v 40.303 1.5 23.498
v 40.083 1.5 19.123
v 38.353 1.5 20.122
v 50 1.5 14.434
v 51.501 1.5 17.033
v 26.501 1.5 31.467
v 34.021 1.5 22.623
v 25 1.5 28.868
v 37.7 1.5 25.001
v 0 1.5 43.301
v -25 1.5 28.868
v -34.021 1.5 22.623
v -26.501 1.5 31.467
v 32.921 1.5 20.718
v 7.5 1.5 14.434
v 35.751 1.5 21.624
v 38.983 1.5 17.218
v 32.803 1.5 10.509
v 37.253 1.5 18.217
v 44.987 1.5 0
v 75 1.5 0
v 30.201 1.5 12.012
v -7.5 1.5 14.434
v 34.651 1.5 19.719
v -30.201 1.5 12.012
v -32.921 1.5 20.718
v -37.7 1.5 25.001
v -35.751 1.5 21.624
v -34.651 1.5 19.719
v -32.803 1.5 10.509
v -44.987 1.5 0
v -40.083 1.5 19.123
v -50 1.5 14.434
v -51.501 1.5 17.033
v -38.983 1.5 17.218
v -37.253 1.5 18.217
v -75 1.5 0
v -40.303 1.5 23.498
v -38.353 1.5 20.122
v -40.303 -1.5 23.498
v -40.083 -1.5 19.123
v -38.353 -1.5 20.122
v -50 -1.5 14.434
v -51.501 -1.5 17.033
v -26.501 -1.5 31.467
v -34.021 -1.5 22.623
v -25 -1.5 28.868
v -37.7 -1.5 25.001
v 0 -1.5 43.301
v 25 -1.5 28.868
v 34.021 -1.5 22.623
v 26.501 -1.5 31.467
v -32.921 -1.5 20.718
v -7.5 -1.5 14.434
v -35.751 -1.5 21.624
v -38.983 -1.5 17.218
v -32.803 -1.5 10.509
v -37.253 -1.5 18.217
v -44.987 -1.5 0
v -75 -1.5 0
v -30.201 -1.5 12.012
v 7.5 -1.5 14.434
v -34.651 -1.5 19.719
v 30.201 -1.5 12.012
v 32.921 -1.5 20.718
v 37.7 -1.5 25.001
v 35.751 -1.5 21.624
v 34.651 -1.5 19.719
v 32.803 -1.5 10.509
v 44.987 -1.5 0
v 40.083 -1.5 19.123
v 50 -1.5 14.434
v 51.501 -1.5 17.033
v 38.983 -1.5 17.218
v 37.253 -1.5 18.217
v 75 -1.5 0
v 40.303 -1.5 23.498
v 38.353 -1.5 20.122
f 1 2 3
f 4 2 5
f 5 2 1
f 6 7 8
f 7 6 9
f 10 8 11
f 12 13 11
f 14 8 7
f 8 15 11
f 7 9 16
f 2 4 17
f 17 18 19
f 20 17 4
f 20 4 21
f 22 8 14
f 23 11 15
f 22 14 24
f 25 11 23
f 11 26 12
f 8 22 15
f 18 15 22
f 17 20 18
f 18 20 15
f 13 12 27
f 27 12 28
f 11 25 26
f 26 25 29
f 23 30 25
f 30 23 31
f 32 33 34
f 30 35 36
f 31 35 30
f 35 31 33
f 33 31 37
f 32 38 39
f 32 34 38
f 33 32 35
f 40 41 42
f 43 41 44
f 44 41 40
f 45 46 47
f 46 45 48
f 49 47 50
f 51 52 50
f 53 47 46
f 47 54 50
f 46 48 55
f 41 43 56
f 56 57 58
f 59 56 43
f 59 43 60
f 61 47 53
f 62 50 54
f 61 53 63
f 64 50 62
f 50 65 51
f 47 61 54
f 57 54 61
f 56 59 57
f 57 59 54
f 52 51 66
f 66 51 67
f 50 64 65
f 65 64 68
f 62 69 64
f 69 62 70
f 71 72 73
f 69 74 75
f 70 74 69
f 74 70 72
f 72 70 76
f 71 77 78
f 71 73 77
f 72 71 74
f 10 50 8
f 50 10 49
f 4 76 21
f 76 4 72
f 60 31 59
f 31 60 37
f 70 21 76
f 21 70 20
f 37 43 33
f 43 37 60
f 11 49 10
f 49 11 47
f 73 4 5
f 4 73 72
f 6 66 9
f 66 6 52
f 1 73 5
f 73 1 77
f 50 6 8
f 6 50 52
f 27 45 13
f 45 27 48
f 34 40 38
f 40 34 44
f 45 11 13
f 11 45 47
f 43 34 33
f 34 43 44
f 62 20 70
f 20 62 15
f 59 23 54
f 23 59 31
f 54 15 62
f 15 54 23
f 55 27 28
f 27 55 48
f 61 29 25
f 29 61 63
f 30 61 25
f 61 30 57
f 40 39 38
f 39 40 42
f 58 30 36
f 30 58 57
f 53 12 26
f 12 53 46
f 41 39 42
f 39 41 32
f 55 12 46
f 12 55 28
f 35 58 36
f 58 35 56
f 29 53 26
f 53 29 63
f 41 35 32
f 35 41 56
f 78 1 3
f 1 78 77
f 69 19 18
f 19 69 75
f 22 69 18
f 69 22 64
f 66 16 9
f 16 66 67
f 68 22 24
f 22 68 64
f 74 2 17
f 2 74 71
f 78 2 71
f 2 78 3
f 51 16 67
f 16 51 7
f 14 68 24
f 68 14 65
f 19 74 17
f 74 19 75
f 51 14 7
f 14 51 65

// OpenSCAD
// file: screw.scad
include <measures.scad>;

/*
 * Positive model of a cavity
 * required for pressing in a nut
 * and screwing in a screw
 */
module screw_cavity()
{
    // cavity for the screw thread
    translate([
        0,
        0,
        -screw_length/2
        ])
    cube([
        screw_radius,
        screw_radius,
        screw_length
        ], center=true);

    // cavity for the nut
    translate([
        0,
        0,
        -nut_offset
        ])
    cube([
        nut_wrench_size,
        nut_wrench_size,
        nut_height
        ], center=true);
}

screw_cavity();
// file: measures.scad
/*
 * All measures of the model
 * Default units: Millimeters
 */

// rendering parameters
$fn = 50;

// material to cut from
material_x = 480;
material_y = 270;
material_z = 3;

// house cuboid
house_x = 150;
house_y = 110;
house_z = 60;

// distances from left and bottom house edges
door_x = 35;
door_z = 35;
door_radius = 35/2;

window_offset_z = 12;
window_triangle_count_x = 7;
window_triangle_count_y = 5;

wall_y = house_y * 1/2;
wall_z = house_z * 4/5;
wall_offset_x = -15;

// pattern on the hallway wall
wall_pattern_offset_y = -19;
wall_pattern_offset_z = -19;
wall_triangle_count_x = 5;
wall_triangle_count_y = 4;

// how many holes per edge
strap_hole_count = 1;
strap_hole_radius = 3;
strap_hole_spacing = house_y/(strap_hole_count+1);
strap_hole_to_edge = 7;

// angle between upper house cuboid edge and roof plane in degrees
roof_angle = 30;

// elevation inside roof corner above upper edge of house cuboid
roof_elevation = tan(roof_angle) * house_x/2;

roof_support_cutout_height = roof_elevation * 1/3;
roof_support_cutout_inset = house_x * 6/20;

// length of a roof plane from top corner to house cuboid corner
roof_hypothenuse = 1/cos(roof_angle) * house_x/2;

// make roof a little longer than required
roof_plane_x = roof_hypothenuse * 1.2;
roof_plane_y = house_y * 1.2;

/*
// M4
screw_radius = 4;
screw_length = 20;
washer_radius = 9;
nut_height = 3.2;
nut_wrench_size = 7;
nut_offset = 7;
*/

// M3
screw_radius = 3.005;
screw_length = 15;
washer_radius = 7;
nut_height = 2.2;
nut_wrench_size = 7;
nut_offset = 5;
// main file
include <measures.scad>;
use <screw.scad>;

module roof_support_nose()
{
    translate([
        house_x/4,
        0,
        roof_elevation/2
        ])
    rotate([
        0,
        roof_angle,
        0
        ])
    cube([
        roof_hypothenuse/3,
        material_z,
        material_z*2.001
        ], center=true);
}

module roof_support_triangle()
{
    // rotate into xz-plane
    rotate([
        90,
        0,
        0
        ])
    // make 3d
    linear_extrude(material_z)
    polygon([
        [-house_x/2,0],
        [+house_x/2,0],
        [0,roof_elevation]
        ]);
}

module roof_support_positive()
{
    // triangle
    translate([
        0,
        material_z/2,
        0
        ])
    roof_support_triangle();

    // add nose left
    roof_support_nose();

    // add nose right
    rotate([
        0,
        0,
        180
        ])
    roof_support_nose();
}

module roof_support()
{
    difference()
    {
        roof_support_positive();

        // cutout polygon
        rotate([
            90,
            0,
            0
            ])
        linear_extrude(material_z*1.2, center=true)
        #polygon([
            [-roof_support_cutout_inset, -0.005],
            [-house_x * 1/20, roof_support_cutout_height],
            [house_x * 1/20, roof_support_cutout_height],
            [roof_support_cutout_inset, -0.005]
            ]);
    }
}

module roof_support_with_screw_cavities()
{
    difference()
    {
        roof_support();

        // cavity for screw left
        translate([
            -house_x/4 - material_z*cos(90-roof_angle) - 0.002,
            0,
            roof_elevation/2 + material_z*sin(90-roof_angle) + 0.002
            ])
        rotate([
            0,
            -roof_angle,
            0
            ])
        screw_cavity();

        // cavity for screw right
        translate([
            +house_x/4 + material_z*cos(90-roof_angle) + 0.002,
            0,
            roof_elevation/2 + material_z*sin(90-roof_angle) + 0.002
            ])
        rotate([
            0,
            roof_angle,
            0
            ])
        screw_cavity();
    }
}

roof_support_with_screw_cavities();
